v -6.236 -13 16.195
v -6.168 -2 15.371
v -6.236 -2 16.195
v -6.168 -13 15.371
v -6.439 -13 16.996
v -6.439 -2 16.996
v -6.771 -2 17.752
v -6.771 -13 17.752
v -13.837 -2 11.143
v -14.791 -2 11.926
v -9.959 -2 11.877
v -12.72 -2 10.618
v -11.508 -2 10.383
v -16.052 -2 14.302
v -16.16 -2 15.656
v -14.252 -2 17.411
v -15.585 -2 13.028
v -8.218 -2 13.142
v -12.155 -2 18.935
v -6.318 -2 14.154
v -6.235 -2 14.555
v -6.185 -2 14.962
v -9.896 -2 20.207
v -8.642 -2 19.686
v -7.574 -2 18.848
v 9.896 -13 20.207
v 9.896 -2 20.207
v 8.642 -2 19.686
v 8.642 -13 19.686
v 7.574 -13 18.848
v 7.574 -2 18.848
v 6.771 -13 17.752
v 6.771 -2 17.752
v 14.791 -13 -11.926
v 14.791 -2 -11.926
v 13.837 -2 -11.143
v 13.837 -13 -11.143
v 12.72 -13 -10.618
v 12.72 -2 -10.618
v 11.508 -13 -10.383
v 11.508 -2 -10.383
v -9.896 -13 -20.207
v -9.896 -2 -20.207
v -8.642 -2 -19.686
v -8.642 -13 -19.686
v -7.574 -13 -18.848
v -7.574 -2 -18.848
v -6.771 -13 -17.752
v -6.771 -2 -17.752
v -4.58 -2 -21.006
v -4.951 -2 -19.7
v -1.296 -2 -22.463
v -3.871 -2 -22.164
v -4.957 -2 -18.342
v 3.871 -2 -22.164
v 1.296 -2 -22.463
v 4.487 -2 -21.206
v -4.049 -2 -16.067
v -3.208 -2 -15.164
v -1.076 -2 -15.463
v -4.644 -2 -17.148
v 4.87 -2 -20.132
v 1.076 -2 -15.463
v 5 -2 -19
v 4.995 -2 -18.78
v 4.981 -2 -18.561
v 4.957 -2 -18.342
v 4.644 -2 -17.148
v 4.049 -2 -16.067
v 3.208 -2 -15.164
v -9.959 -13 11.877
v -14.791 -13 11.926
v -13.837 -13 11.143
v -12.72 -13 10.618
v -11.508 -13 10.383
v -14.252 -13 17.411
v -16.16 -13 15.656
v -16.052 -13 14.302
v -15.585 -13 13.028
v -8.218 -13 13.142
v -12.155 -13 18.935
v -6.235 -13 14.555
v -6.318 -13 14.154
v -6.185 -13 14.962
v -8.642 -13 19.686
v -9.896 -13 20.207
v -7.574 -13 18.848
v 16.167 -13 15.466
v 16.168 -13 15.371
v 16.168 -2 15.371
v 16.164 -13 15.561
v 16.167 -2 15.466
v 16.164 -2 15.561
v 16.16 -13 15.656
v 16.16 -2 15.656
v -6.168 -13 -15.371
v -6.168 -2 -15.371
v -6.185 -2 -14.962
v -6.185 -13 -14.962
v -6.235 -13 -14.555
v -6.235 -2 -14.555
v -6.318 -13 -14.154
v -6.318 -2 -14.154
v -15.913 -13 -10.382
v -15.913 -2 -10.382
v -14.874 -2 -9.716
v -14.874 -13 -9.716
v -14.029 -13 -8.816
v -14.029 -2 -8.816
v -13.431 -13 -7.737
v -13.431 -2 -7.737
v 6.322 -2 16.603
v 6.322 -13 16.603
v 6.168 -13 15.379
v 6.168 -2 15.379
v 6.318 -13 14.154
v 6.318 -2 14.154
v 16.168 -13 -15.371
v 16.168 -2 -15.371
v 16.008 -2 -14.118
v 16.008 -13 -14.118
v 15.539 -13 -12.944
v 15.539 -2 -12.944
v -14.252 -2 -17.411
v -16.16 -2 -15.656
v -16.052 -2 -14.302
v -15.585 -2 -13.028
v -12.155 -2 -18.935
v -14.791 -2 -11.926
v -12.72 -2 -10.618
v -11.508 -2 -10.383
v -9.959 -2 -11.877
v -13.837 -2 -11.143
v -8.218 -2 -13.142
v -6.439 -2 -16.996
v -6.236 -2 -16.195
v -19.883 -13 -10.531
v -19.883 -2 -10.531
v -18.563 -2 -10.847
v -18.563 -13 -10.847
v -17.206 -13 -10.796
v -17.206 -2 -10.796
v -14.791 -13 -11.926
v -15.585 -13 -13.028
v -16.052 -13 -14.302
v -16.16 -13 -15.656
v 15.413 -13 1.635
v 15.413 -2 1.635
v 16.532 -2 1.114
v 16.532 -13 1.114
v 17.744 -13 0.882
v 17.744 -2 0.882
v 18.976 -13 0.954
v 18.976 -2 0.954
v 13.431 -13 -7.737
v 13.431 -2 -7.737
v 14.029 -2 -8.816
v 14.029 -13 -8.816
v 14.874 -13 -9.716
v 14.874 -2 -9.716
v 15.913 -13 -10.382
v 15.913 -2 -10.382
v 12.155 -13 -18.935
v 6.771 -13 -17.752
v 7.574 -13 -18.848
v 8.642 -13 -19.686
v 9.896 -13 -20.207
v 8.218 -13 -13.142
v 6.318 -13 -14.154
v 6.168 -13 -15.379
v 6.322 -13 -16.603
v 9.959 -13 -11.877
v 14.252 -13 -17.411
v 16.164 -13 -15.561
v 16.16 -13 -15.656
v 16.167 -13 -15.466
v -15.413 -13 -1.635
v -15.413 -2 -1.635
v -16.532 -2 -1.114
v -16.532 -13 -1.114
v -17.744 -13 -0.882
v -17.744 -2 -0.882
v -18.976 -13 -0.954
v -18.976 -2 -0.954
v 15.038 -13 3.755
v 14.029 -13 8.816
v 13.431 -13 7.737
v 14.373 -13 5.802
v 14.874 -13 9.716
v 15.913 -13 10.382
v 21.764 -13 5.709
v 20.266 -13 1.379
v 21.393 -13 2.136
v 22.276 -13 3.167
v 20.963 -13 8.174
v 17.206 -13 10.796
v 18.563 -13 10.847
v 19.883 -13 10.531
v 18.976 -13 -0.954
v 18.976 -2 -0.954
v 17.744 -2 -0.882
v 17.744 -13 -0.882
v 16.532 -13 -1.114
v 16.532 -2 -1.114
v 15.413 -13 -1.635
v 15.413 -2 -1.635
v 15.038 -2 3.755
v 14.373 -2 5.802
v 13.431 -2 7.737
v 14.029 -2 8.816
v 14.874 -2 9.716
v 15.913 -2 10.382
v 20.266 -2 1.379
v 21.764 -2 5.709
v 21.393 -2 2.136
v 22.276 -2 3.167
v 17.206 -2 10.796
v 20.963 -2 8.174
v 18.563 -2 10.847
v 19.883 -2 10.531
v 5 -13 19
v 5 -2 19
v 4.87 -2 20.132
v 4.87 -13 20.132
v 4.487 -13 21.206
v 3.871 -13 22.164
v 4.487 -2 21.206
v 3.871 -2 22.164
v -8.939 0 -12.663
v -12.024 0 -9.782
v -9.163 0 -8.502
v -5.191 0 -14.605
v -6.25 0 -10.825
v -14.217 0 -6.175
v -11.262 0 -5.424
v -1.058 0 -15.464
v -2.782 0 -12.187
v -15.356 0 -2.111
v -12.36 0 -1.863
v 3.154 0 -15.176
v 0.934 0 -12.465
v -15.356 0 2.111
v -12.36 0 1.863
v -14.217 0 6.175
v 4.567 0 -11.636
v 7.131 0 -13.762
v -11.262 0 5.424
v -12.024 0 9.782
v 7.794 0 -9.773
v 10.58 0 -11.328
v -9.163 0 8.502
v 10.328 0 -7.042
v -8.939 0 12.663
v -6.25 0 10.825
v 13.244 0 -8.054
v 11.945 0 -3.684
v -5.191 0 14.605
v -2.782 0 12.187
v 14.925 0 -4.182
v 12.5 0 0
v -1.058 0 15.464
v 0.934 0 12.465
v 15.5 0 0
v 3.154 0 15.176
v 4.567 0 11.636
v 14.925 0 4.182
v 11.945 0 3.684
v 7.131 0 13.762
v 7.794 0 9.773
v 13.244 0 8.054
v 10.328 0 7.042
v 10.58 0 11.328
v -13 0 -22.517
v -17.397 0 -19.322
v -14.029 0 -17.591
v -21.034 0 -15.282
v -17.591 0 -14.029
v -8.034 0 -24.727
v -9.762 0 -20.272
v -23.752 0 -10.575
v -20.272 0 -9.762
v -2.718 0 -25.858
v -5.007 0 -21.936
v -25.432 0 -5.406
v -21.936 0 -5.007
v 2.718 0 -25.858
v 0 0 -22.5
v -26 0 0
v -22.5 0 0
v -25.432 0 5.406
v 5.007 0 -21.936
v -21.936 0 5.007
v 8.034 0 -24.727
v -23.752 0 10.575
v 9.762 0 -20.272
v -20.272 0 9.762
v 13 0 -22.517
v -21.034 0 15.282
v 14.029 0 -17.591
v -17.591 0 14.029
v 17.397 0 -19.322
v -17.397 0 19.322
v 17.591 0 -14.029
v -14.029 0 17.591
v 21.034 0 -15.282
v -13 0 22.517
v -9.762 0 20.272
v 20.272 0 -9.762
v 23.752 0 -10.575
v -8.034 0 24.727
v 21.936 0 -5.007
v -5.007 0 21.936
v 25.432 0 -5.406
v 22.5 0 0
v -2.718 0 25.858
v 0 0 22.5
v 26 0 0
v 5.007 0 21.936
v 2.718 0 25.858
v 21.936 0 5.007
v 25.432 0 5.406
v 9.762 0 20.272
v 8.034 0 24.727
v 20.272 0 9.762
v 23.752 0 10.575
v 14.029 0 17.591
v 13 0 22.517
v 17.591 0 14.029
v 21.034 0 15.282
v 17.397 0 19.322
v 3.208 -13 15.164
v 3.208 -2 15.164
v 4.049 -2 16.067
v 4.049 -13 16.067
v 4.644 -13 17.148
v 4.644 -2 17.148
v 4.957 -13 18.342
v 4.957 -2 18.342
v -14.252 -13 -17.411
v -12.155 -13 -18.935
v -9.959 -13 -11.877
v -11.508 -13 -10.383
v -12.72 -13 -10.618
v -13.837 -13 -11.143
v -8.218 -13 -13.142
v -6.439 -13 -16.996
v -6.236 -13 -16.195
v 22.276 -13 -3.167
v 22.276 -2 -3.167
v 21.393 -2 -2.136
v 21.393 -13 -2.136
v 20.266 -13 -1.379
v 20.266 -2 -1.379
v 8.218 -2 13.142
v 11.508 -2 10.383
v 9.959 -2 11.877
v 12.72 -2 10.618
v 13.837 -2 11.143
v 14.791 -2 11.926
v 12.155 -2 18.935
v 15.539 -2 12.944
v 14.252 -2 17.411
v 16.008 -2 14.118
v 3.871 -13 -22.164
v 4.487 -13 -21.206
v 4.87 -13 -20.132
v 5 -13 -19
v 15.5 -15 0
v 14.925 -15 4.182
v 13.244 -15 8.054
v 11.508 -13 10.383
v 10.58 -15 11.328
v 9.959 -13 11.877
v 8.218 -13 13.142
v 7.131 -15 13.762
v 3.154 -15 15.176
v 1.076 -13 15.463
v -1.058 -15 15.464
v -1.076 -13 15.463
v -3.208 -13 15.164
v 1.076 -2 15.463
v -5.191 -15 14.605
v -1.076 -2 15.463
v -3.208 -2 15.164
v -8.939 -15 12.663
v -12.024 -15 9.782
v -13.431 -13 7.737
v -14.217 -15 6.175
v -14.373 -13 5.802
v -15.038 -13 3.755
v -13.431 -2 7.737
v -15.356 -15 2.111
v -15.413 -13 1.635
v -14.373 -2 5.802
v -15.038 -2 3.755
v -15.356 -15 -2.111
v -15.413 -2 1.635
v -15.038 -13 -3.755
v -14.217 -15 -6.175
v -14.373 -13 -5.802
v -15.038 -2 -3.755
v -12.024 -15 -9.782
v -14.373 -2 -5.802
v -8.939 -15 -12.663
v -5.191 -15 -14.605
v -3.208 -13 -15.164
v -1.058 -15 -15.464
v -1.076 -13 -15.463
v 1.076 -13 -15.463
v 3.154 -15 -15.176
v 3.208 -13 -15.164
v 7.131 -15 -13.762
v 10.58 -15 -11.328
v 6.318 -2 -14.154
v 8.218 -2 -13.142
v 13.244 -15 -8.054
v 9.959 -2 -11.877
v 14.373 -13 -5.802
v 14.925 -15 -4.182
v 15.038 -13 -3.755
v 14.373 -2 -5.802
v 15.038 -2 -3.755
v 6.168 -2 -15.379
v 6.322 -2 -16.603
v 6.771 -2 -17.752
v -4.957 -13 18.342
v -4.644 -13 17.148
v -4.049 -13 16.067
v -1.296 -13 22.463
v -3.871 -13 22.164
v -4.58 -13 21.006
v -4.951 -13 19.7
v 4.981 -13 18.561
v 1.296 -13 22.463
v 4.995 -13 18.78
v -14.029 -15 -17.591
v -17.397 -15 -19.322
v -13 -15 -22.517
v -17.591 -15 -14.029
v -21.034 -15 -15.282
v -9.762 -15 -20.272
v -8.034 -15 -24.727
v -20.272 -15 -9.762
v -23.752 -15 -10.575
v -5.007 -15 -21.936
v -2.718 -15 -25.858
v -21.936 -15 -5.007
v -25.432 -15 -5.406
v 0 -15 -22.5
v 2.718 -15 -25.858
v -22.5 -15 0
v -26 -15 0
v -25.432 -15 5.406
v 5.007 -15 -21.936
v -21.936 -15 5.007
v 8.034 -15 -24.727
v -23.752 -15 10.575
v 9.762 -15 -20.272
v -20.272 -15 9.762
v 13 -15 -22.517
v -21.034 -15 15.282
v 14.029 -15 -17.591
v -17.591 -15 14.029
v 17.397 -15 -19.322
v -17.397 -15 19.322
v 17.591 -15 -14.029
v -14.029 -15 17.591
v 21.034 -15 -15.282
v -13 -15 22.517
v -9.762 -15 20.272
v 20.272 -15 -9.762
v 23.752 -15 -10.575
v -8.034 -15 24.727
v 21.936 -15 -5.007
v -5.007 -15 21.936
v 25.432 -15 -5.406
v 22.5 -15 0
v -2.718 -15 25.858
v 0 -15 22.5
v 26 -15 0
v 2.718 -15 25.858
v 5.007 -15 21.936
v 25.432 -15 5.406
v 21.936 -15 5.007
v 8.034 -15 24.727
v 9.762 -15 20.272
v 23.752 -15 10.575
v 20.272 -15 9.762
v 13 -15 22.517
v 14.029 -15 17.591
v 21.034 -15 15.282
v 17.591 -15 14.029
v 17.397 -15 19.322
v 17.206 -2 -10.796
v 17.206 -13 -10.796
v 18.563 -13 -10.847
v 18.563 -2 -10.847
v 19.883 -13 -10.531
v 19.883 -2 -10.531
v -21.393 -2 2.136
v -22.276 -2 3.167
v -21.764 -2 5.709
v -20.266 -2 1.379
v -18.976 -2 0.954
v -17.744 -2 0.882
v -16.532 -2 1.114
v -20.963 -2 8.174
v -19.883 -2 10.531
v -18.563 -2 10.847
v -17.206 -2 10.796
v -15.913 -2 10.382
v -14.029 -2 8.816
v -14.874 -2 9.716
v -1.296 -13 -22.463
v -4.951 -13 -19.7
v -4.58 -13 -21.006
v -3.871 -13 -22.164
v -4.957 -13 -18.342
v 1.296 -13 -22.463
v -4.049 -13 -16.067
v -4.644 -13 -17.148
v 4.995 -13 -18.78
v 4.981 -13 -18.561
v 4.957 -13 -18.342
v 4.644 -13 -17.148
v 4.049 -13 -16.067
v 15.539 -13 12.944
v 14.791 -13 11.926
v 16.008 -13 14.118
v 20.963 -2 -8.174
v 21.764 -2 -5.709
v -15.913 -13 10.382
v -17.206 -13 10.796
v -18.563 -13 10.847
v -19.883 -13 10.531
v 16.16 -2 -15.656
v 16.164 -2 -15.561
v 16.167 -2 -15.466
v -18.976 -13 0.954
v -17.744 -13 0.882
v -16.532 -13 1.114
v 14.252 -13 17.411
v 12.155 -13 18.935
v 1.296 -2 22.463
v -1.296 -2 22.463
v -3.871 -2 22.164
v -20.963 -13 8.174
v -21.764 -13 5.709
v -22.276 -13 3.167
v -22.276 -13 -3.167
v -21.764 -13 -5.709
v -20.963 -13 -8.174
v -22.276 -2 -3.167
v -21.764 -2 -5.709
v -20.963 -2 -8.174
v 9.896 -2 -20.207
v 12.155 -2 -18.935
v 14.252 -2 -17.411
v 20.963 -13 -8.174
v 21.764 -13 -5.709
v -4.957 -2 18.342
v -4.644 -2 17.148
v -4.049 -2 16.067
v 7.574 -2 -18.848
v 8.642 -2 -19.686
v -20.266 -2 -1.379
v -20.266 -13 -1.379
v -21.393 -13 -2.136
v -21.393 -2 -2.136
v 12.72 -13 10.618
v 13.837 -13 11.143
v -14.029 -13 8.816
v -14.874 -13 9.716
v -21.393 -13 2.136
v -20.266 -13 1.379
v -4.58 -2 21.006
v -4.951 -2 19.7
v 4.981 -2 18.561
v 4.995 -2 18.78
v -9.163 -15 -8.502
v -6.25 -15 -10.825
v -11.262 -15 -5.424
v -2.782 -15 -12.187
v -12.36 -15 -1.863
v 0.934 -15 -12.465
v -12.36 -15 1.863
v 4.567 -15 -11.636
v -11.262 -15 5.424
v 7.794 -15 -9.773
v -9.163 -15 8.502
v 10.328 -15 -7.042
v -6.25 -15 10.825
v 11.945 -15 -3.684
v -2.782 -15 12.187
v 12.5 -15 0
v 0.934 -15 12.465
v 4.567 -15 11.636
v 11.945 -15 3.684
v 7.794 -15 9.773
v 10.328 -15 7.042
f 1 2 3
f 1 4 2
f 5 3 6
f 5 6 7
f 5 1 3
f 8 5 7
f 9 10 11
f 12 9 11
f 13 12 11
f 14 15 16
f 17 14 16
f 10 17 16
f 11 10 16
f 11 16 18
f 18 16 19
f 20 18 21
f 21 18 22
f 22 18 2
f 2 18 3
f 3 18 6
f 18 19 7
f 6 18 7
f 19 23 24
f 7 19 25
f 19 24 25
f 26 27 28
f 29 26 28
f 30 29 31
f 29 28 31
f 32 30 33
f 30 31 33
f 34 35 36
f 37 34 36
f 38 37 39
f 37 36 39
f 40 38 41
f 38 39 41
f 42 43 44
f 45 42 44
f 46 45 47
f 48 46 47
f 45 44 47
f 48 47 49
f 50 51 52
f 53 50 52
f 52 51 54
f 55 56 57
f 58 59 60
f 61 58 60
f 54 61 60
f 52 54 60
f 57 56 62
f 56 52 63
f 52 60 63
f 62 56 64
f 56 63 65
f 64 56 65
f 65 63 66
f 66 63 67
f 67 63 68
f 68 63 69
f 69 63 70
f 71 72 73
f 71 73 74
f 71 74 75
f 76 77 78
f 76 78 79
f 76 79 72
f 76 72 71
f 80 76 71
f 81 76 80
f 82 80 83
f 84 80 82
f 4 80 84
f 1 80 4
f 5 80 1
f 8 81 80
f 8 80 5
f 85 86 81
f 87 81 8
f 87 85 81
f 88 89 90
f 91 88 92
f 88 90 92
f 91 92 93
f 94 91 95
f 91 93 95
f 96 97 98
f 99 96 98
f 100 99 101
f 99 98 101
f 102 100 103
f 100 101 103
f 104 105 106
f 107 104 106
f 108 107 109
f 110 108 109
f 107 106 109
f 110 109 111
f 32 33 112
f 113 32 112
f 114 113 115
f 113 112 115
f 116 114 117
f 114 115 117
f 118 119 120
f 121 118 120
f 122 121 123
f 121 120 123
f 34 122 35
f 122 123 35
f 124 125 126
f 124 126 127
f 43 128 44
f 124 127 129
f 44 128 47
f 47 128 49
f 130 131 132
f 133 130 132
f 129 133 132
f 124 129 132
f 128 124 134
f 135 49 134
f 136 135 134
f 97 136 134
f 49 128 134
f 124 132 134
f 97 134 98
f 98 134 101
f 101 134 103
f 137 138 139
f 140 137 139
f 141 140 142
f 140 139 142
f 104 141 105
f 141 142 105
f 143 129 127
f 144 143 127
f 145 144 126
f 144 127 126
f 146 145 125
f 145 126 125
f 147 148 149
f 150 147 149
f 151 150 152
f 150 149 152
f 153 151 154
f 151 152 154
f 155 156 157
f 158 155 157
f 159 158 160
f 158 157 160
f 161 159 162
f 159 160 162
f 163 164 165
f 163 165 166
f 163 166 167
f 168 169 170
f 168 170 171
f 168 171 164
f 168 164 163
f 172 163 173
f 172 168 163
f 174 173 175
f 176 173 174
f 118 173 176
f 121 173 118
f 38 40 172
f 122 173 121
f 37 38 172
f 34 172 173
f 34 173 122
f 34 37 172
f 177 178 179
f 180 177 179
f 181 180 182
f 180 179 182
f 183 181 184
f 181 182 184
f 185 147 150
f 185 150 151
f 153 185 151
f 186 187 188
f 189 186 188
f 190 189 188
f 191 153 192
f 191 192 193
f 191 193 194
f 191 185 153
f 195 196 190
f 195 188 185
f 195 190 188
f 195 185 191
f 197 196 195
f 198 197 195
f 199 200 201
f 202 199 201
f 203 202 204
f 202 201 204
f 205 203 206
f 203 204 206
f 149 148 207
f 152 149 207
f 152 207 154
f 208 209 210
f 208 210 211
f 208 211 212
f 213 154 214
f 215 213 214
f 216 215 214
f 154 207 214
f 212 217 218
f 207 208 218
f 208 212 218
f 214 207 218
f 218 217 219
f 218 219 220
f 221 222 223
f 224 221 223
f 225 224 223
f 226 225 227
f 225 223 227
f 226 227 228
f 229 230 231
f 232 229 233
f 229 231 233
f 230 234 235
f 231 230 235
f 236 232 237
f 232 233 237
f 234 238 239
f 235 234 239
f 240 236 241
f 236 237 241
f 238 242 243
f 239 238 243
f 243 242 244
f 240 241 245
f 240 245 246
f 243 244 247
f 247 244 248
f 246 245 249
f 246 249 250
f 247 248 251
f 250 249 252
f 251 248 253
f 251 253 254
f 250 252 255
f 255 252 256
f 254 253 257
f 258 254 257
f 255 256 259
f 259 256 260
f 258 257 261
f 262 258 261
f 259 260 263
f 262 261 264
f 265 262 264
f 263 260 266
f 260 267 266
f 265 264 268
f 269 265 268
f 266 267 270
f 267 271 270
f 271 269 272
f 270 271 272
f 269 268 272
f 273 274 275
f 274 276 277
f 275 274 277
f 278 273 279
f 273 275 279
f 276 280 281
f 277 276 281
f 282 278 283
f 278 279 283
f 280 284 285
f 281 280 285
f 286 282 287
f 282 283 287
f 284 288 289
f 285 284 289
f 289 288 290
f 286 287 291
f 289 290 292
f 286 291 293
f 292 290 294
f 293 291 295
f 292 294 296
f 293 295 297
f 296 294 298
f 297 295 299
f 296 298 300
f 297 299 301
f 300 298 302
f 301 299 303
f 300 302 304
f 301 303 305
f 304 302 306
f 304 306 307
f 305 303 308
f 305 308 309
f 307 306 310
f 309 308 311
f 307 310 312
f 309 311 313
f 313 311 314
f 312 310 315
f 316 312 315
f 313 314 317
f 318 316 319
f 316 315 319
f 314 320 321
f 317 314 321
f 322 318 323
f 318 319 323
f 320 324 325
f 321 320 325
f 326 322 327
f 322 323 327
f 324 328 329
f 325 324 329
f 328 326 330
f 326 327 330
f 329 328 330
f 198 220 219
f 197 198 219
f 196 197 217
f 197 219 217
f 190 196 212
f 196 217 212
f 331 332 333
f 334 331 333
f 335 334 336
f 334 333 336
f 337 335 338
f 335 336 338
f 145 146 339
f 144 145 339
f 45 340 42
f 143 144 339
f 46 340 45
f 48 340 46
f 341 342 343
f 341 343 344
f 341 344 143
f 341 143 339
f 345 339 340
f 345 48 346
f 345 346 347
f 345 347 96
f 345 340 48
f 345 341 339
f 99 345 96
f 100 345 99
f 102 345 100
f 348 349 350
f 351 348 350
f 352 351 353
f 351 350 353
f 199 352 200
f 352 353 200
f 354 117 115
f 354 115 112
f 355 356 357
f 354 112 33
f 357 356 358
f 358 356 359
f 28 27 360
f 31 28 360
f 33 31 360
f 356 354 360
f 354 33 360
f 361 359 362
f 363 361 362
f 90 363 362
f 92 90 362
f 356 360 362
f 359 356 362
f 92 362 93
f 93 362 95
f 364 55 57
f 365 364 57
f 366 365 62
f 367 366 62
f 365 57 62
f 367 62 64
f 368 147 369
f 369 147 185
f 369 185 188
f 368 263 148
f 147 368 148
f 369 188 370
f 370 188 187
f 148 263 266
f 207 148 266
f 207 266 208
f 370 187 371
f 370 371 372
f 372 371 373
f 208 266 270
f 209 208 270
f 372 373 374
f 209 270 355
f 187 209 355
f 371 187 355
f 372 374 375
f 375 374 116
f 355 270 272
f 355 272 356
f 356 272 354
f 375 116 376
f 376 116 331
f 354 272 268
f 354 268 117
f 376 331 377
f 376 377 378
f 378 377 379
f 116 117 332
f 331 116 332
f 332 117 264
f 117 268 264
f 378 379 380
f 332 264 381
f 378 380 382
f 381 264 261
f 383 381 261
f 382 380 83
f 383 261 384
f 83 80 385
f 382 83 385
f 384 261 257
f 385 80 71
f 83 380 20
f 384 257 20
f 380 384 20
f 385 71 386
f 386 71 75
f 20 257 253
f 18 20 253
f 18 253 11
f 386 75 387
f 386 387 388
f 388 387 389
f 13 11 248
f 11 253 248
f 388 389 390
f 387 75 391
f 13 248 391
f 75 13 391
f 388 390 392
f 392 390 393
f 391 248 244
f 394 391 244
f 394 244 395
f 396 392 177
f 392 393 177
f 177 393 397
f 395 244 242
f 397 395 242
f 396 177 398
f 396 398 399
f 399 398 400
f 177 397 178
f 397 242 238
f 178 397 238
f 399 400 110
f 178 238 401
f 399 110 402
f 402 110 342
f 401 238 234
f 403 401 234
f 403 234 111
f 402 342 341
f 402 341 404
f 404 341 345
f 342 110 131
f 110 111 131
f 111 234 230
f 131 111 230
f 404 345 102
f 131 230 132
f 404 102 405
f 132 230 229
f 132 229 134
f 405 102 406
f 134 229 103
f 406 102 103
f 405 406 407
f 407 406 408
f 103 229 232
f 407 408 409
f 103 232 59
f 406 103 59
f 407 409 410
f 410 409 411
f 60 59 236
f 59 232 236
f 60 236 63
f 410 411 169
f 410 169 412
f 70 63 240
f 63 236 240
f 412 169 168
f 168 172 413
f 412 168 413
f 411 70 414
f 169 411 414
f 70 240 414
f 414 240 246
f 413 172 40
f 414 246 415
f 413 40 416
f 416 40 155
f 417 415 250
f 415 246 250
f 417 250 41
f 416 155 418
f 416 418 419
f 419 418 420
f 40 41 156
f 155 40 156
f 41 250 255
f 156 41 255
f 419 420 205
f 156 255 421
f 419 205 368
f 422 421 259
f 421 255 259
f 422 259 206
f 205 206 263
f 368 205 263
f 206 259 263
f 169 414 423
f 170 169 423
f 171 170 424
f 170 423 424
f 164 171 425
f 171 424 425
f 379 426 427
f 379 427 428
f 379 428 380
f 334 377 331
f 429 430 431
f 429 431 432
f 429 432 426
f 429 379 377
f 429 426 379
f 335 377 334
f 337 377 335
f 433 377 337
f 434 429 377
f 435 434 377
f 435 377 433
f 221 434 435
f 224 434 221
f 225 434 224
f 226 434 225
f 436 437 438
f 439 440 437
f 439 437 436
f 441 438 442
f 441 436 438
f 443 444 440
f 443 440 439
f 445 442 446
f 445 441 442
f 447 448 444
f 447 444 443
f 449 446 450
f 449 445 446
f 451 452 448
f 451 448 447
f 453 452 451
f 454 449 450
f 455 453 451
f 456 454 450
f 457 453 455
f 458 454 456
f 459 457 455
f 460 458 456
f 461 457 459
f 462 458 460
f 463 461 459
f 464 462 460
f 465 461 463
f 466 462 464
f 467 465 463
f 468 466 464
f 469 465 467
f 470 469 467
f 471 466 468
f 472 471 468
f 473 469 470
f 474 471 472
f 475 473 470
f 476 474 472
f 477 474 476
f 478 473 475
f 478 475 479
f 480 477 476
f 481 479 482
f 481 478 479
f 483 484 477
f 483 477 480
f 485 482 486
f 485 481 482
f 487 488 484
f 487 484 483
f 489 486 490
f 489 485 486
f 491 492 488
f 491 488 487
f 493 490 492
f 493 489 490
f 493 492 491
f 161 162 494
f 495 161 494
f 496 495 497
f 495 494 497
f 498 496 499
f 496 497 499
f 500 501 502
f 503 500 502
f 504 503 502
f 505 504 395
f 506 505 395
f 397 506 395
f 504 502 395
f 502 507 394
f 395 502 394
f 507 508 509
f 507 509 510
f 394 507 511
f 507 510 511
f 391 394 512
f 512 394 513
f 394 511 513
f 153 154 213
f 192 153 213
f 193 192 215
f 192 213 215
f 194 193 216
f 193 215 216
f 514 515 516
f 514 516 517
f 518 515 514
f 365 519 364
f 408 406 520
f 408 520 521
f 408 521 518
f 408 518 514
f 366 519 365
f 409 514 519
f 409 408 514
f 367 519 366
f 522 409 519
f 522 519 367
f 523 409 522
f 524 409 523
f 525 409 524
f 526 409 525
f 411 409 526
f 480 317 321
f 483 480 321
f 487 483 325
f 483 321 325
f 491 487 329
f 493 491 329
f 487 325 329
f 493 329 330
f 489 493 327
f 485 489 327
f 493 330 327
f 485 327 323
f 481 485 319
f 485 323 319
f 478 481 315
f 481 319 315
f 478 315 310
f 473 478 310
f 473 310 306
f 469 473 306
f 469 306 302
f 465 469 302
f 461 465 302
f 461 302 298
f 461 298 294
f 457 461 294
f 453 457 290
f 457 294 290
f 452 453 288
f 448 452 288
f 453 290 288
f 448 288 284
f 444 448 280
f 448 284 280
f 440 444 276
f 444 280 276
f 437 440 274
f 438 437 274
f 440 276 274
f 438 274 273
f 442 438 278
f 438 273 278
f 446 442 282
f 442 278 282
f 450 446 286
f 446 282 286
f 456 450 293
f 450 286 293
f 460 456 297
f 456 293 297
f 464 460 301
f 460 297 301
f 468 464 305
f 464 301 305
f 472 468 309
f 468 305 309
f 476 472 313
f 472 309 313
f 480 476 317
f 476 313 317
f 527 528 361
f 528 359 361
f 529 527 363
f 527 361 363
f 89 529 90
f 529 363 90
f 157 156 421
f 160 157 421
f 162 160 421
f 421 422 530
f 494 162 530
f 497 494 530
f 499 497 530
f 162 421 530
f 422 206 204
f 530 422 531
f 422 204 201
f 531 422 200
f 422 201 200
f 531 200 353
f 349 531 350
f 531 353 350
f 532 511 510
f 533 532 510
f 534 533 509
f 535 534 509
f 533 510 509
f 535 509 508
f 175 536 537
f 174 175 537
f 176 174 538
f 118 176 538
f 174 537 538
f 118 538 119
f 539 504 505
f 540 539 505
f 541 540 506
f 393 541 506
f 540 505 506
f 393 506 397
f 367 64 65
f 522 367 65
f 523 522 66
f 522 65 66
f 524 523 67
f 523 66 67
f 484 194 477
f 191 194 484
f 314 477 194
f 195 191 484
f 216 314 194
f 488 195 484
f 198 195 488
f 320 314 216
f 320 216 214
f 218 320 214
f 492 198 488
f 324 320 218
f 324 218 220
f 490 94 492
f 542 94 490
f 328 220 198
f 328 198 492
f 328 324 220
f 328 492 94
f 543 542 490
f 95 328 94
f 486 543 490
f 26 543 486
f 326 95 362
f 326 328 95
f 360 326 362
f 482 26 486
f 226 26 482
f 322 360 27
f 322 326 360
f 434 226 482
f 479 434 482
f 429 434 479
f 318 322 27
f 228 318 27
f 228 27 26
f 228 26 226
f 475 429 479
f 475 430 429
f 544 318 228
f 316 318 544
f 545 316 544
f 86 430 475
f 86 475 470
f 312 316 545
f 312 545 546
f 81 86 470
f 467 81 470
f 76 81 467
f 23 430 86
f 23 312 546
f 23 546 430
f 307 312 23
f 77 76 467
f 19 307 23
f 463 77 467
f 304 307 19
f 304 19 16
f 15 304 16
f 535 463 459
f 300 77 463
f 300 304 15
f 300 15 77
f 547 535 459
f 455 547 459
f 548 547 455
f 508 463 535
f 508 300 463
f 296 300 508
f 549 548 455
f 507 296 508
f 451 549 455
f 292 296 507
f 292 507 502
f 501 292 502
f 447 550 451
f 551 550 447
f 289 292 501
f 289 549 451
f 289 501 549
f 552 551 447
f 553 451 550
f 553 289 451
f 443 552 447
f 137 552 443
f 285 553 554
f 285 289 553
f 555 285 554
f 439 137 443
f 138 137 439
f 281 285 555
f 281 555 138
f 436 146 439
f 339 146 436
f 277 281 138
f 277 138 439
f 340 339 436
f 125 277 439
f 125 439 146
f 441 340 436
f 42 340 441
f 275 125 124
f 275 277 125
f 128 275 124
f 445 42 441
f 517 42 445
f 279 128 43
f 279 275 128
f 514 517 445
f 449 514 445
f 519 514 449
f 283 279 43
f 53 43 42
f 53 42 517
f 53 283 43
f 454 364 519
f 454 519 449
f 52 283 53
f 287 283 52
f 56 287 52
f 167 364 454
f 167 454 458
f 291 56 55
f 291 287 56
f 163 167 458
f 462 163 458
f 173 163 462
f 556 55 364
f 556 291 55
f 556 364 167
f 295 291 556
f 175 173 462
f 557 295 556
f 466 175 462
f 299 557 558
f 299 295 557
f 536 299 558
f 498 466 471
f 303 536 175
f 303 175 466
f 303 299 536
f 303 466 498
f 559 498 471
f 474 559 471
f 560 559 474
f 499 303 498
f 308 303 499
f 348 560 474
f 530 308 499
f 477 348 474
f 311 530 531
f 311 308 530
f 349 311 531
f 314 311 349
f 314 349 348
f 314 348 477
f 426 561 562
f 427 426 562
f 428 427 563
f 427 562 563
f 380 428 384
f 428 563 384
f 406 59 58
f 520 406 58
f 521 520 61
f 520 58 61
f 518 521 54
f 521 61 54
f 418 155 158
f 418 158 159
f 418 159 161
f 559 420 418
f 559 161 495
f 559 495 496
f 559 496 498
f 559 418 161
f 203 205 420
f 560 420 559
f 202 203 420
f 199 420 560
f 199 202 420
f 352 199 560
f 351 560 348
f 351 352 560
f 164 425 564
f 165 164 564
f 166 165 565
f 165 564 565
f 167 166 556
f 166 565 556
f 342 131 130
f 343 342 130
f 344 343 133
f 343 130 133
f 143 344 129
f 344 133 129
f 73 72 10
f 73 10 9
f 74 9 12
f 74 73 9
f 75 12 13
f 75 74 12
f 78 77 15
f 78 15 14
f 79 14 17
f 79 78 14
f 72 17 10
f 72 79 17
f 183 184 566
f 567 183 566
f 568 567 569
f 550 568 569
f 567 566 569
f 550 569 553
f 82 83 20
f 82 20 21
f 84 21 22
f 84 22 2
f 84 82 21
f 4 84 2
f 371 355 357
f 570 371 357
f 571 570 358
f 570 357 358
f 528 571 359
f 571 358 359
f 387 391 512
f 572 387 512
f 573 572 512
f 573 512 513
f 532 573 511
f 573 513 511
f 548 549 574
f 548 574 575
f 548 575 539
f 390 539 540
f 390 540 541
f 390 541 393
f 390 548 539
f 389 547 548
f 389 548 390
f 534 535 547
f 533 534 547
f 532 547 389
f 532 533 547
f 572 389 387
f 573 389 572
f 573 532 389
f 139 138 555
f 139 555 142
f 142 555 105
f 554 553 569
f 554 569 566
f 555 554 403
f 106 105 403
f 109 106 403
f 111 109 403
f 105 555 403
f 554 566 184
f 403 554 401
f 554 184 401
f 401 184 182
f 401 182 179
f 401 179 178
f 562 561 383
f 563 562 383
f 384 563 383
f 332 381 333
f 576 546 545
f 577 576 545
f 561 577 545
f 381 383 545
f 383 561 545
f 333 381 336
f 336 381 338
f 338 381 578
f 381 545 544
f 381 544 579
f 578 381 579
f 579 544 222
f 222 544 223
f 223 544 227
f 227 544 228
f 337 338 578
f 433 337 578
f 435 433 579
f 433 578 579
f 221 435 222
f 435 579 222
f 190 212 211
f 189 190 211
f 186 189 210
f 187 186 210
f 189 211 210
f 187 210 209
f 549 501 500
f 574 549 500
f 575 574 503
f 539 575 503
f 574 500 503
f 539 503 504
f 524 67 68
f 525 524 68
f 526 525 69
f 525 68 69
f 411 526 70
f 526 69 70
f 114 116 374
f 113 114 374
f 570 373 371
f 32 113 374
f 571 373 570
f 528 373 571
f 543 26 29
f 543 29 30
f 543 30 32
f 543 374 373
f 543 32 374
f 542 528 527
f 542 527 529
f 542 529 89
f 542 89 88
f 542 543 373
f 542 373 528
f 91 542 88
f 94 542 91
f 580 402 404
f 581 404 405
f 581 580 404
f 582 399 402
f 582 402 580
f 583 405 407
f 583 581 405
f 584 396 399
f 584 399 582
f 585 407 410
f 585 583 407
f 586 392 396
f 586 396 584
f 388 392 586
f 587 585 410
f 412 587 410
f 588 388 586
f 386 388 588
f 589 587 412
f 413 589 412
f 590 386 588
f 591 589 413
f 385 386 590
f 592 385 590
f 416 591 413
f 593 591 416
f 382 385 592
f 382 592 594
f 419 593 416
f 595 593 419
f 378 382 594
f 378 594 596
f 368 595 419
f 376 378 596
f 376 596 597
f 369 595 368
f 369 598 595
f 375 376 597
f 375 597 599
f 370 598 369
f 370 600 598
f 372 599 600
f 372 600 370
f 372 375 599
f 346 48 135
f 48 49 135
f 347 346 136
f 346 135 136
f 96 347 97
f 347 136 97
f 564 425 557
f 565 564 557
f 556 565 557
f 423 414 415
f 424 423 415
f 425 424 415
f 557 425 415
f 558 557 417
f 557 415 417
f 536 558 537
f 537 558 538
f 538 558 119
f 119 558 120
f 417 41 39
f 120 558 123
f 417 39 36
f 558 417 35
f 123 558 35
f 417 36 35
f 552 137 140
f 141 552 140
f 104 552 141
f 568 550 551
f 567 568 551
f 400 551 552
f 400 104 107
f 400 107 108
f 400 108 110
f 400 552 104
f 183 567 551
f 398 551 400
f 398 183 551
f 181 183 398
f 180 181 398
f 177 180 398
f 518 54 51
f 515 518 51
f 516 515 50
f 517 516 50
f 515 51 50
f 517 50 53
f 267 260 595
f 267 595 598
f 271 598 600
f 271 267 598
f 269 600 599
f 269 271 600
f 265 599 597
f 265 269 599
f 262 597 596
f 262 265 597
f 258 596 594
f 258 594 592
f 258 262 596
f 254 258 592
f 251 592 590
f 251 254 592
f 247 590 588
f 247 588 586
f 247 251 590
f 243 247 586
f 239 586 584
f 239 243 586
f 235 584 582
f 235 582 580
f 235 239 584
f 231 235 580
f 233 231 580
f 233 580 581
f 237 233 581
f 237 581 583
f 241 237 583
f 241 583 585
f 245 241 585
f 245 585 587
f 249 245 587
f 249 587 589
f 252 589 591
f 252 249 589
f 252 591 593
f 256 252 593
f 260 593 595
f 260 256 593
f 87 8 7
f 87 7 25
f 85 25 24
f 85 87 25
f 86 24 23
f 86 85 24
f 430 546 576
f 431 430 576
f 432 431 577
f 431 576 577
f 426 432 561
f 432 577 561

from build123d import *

# Parameters (mm, degrees)
F2_R     = 26
F2_R_2   = 22.5
F3_DEPTH = 15
F1_R     = 15.5
F1_R_2   = 12.5
F4_DEPTH = 15
F6_DEPTH = 5.5


with BuildPart() as f3:
    # F2 (on Front) → F3 (new body)
    with BuildSketch(Plane.XZ):
        Circle(F2_R)
        Circle(F2_R_2, mode=Mode.SUBTRACT)
    extrude(amount=F3_DEPTH)



with BuildPart() as f4:
    # F1 (on Front) → F4 (new body)
    with BuildSketch(Plane.XZ):
        Circle(F1_R)
        Circle(F1_R_2, mode=Mode.SUBTRACT)
    extrude(amount=F4_DEPTH)


with BuildPart() as f3_1:
    add(f3.part)

    add(f4.part)  # F6 merges F4
    # F5 (on offset) → F6 (join, symmetric)
    with BuildSketch(Plane.XZ.offset(7.5)):
        with BuildLine():
            ThreePointArc((-18.97603, 0.954084), (-18.070074, 5.871323), (-15.912727, 10.381961))
            ThreePointArc((-15.912727, 10.381961), (-22.825356, 7.416408), (-18.97603, 0.954084))
        make_face()
        with BuildLine():
            ThreePointArc((-13.070074, 5.871323), (-13.840019, 8.53715), (-15.912727, 10.381961))
            ThreePointArc((-15.912727, 10.381961), (-18.070074, 5.871323), (-18.97603, 0.954084))
            ThreePointArc((-18.97603, 0.954084), (-14.870838, 2.028812), (-13.070074, 5.871323))
        make_face()
        with BuildLine():
            ThreePointArc((-18.97603, -0.954084), (-22.825356, -7.416408), (-15.912727, -10.381961))
            ThreePointArc((-15.912727, -10.381961), (-18.070074, -5.871323), (-18.97603, -0.954084))
        make_face()
        with BuildLine():
            ThreePointArc((-18.97603, -0.954084), (-18.070074, -5.871323), (-15.912727, -10.381961))
            ThreePointArc((-15.912727, -10.381961), (-13.840019, -8.53715), (-13.070074, -5.871323))
            ThreePointArc((-13.070074, -5.871323), (-14.870838, -2.028812), (-18.97603, -0.954084))
        make_face()
        with BuildLine():
            ThreePointArc((-14.791135, -11.925701), (-14.106846, -19.416408), (-6.771303, -17.752449))
            ThreePointArc((-6.771303, -17.752449), (-11.16792, -15.371323), (-14.791135, -11.925701))
        make_face()
        with BuildLine():
            ThreePointArc((-14.791135, -11.925701), (-11.16792, -15.371323), (-6.771303, -17.752449))
            ThreePointArc((-6.771303, -17.752449), (-6.321112, -16.599516), (-6.16792, -15.371323))
            ThreePointArc((-6.16792, -15.371323), (-9.312667, -10.72826), (-14.791135, -11.925701))
        make_face()
        with BuildLine():
            ThreePointArc((5, -19), (4.98912, -18.670335), (4.956528, -18.342105))
            ThreePointArc((4.956528, -18.342105), (0, -19), (-4.956528, -18.342105))
            ThreePointArc((-4.956528, -18.342105), (-0.329665, -23.98912), (5, -19))
        make_face()
        with BuildLine():
            ThreePointArc((-4.956528, -18.342105), (0, -19), (4.956528, -18.342105))
            ThreePointArc((4.956528, -18.342105), (0, -14), (-4.956528, -18.342105))
        make_face()
        with BuildLine():
            ThreePointArc((6.771303, -17.752449), (11.16792, -15.371323), (14.791135, -11.925701))
            ThreePointArc((14.791135, -11.925701), (8.228994, -11.326238), (6.771303, -17.752449))
        make_face()
        with BuildLine():
            ThreePointArc((16.16792, -15.371323), (15.810983, -13.51607), (14.791135, -11.925701))
            ThreePointArc((14.791135, -11.925701), (11.16792, -15.371323), (6.771303, -17.752449))
            ThreePointArc((6.771303, -17.752449), (12.396113, -20.21813), (16.16792, -15.371323))
        make_face()
        with BuildLine():
            ThreePointArc((15.912727, -10.381961), (18.070074, -5.871323), (18.97603, -0.954084))
            ThreePointArc((18.97603, -0.954084), (13.314791, -4.326238), (15.912727, -10.381961))
        make_face()
        with BuildLine():
            ThreePointArc((23.070074, -5.871323), (21.912585, -2.672087), (18.97603, -0.954084))
            ThreePointArc((18.97603, -0.954084), (18.070074, -5.871323), (15.912727, -10.381961))
            ThreePointArc((15.912727, -10.381961), (20.735901, -10.101378), (23.070074, -5.871323))
        make_face()
        with BuildLine():
            ThreePointArc((15.912727, 10.381961), (13.314791, 4.326238), (18.97603, 0.954084))
            ThreePointArc((18.97603, 0.954084), (18.070074, 5.871323), (15.912727, 10.381961))
        make_face()
        with BuildLine():
            ThreePointArc((15.912727, 10.381961), (18.070074, 5.871323), (18.97603, 0.954084))
            ThreePointArc((18.97603, 0.954084), (21.912585, 2.672087), (23.070074, 5.871323))
            ThreePointArc((23.070074, 5.871323), (20.735901, 10.101378), (15.912727, 10.381961))
        make_face()
        with BuildLine():
            ThreePointArc((6.771303, 17.752449), (8.228994, 11.326238), (14.791135, 11.925701))
            ThreePointArc((14.791135, 11.925701), (11.16792, 15.371323), (6.771303, 17.752449))
        make_face()
        with BuildLine():
            ThreePointArc((6.771303, 17.752449), (11.16792, 15.371323), (14.791135, 11.925701))
            ThreePointArc((14.791135, 11.925701), (15.810983, 13.51607), (16.16792, 15.371323))
            ThreePointArc((16.16792, 15.371323), (12.396113, 20.21813), (6.771303, 17.752449))
        make_face()
        with BuildLine():
            ThreePointArc((-4.956528, 18.342105), (0, 19), (4.956528, 18.342105))
            ThreePointArc((4.956528, 18.342105), (4.98912, 18.670335), (5, 19))
            ThreePointArc((5, 19), (-0.329665, 23.98912), (-4.956528, 18.342105))
        make_face()
        with BuildLine():
            ThreePointArc((-4.956528, 18.342105), (0, 14), (4.956528, 18.342105))
            ThreePointArc((4.956528, 18.342105), (0, 19), (-4.956528, 18.342105))
        make_face()
        with BuildLine():
            ThreePointArc((-6.16792, 15.371323), (-6.321112, 16.599516), (-6.771303, 17.752449))
            ThreePointArc((-6.771303, 17.752449), (-11.16792, 15.371323), (-14.791135, 11.925701))
            ThreePointArc((-14.791135, 11.925701), (-9.312667, 10.72826), (-6.16792, 15.371323))
        make_face()
        with BuildLine():
            ThreePointArc((-14.791135, 11.925701), (-11.16792, 15.371323), (-6.771303, 17.752449))
            ThreePointArc((-6.771303, 17.752449), (-14.106846, 19.416408), (-14.791135, 11.925701))
        make_face()
    extrude(amount=F6_DEPTH, both=True)


solid = f3_1.part
